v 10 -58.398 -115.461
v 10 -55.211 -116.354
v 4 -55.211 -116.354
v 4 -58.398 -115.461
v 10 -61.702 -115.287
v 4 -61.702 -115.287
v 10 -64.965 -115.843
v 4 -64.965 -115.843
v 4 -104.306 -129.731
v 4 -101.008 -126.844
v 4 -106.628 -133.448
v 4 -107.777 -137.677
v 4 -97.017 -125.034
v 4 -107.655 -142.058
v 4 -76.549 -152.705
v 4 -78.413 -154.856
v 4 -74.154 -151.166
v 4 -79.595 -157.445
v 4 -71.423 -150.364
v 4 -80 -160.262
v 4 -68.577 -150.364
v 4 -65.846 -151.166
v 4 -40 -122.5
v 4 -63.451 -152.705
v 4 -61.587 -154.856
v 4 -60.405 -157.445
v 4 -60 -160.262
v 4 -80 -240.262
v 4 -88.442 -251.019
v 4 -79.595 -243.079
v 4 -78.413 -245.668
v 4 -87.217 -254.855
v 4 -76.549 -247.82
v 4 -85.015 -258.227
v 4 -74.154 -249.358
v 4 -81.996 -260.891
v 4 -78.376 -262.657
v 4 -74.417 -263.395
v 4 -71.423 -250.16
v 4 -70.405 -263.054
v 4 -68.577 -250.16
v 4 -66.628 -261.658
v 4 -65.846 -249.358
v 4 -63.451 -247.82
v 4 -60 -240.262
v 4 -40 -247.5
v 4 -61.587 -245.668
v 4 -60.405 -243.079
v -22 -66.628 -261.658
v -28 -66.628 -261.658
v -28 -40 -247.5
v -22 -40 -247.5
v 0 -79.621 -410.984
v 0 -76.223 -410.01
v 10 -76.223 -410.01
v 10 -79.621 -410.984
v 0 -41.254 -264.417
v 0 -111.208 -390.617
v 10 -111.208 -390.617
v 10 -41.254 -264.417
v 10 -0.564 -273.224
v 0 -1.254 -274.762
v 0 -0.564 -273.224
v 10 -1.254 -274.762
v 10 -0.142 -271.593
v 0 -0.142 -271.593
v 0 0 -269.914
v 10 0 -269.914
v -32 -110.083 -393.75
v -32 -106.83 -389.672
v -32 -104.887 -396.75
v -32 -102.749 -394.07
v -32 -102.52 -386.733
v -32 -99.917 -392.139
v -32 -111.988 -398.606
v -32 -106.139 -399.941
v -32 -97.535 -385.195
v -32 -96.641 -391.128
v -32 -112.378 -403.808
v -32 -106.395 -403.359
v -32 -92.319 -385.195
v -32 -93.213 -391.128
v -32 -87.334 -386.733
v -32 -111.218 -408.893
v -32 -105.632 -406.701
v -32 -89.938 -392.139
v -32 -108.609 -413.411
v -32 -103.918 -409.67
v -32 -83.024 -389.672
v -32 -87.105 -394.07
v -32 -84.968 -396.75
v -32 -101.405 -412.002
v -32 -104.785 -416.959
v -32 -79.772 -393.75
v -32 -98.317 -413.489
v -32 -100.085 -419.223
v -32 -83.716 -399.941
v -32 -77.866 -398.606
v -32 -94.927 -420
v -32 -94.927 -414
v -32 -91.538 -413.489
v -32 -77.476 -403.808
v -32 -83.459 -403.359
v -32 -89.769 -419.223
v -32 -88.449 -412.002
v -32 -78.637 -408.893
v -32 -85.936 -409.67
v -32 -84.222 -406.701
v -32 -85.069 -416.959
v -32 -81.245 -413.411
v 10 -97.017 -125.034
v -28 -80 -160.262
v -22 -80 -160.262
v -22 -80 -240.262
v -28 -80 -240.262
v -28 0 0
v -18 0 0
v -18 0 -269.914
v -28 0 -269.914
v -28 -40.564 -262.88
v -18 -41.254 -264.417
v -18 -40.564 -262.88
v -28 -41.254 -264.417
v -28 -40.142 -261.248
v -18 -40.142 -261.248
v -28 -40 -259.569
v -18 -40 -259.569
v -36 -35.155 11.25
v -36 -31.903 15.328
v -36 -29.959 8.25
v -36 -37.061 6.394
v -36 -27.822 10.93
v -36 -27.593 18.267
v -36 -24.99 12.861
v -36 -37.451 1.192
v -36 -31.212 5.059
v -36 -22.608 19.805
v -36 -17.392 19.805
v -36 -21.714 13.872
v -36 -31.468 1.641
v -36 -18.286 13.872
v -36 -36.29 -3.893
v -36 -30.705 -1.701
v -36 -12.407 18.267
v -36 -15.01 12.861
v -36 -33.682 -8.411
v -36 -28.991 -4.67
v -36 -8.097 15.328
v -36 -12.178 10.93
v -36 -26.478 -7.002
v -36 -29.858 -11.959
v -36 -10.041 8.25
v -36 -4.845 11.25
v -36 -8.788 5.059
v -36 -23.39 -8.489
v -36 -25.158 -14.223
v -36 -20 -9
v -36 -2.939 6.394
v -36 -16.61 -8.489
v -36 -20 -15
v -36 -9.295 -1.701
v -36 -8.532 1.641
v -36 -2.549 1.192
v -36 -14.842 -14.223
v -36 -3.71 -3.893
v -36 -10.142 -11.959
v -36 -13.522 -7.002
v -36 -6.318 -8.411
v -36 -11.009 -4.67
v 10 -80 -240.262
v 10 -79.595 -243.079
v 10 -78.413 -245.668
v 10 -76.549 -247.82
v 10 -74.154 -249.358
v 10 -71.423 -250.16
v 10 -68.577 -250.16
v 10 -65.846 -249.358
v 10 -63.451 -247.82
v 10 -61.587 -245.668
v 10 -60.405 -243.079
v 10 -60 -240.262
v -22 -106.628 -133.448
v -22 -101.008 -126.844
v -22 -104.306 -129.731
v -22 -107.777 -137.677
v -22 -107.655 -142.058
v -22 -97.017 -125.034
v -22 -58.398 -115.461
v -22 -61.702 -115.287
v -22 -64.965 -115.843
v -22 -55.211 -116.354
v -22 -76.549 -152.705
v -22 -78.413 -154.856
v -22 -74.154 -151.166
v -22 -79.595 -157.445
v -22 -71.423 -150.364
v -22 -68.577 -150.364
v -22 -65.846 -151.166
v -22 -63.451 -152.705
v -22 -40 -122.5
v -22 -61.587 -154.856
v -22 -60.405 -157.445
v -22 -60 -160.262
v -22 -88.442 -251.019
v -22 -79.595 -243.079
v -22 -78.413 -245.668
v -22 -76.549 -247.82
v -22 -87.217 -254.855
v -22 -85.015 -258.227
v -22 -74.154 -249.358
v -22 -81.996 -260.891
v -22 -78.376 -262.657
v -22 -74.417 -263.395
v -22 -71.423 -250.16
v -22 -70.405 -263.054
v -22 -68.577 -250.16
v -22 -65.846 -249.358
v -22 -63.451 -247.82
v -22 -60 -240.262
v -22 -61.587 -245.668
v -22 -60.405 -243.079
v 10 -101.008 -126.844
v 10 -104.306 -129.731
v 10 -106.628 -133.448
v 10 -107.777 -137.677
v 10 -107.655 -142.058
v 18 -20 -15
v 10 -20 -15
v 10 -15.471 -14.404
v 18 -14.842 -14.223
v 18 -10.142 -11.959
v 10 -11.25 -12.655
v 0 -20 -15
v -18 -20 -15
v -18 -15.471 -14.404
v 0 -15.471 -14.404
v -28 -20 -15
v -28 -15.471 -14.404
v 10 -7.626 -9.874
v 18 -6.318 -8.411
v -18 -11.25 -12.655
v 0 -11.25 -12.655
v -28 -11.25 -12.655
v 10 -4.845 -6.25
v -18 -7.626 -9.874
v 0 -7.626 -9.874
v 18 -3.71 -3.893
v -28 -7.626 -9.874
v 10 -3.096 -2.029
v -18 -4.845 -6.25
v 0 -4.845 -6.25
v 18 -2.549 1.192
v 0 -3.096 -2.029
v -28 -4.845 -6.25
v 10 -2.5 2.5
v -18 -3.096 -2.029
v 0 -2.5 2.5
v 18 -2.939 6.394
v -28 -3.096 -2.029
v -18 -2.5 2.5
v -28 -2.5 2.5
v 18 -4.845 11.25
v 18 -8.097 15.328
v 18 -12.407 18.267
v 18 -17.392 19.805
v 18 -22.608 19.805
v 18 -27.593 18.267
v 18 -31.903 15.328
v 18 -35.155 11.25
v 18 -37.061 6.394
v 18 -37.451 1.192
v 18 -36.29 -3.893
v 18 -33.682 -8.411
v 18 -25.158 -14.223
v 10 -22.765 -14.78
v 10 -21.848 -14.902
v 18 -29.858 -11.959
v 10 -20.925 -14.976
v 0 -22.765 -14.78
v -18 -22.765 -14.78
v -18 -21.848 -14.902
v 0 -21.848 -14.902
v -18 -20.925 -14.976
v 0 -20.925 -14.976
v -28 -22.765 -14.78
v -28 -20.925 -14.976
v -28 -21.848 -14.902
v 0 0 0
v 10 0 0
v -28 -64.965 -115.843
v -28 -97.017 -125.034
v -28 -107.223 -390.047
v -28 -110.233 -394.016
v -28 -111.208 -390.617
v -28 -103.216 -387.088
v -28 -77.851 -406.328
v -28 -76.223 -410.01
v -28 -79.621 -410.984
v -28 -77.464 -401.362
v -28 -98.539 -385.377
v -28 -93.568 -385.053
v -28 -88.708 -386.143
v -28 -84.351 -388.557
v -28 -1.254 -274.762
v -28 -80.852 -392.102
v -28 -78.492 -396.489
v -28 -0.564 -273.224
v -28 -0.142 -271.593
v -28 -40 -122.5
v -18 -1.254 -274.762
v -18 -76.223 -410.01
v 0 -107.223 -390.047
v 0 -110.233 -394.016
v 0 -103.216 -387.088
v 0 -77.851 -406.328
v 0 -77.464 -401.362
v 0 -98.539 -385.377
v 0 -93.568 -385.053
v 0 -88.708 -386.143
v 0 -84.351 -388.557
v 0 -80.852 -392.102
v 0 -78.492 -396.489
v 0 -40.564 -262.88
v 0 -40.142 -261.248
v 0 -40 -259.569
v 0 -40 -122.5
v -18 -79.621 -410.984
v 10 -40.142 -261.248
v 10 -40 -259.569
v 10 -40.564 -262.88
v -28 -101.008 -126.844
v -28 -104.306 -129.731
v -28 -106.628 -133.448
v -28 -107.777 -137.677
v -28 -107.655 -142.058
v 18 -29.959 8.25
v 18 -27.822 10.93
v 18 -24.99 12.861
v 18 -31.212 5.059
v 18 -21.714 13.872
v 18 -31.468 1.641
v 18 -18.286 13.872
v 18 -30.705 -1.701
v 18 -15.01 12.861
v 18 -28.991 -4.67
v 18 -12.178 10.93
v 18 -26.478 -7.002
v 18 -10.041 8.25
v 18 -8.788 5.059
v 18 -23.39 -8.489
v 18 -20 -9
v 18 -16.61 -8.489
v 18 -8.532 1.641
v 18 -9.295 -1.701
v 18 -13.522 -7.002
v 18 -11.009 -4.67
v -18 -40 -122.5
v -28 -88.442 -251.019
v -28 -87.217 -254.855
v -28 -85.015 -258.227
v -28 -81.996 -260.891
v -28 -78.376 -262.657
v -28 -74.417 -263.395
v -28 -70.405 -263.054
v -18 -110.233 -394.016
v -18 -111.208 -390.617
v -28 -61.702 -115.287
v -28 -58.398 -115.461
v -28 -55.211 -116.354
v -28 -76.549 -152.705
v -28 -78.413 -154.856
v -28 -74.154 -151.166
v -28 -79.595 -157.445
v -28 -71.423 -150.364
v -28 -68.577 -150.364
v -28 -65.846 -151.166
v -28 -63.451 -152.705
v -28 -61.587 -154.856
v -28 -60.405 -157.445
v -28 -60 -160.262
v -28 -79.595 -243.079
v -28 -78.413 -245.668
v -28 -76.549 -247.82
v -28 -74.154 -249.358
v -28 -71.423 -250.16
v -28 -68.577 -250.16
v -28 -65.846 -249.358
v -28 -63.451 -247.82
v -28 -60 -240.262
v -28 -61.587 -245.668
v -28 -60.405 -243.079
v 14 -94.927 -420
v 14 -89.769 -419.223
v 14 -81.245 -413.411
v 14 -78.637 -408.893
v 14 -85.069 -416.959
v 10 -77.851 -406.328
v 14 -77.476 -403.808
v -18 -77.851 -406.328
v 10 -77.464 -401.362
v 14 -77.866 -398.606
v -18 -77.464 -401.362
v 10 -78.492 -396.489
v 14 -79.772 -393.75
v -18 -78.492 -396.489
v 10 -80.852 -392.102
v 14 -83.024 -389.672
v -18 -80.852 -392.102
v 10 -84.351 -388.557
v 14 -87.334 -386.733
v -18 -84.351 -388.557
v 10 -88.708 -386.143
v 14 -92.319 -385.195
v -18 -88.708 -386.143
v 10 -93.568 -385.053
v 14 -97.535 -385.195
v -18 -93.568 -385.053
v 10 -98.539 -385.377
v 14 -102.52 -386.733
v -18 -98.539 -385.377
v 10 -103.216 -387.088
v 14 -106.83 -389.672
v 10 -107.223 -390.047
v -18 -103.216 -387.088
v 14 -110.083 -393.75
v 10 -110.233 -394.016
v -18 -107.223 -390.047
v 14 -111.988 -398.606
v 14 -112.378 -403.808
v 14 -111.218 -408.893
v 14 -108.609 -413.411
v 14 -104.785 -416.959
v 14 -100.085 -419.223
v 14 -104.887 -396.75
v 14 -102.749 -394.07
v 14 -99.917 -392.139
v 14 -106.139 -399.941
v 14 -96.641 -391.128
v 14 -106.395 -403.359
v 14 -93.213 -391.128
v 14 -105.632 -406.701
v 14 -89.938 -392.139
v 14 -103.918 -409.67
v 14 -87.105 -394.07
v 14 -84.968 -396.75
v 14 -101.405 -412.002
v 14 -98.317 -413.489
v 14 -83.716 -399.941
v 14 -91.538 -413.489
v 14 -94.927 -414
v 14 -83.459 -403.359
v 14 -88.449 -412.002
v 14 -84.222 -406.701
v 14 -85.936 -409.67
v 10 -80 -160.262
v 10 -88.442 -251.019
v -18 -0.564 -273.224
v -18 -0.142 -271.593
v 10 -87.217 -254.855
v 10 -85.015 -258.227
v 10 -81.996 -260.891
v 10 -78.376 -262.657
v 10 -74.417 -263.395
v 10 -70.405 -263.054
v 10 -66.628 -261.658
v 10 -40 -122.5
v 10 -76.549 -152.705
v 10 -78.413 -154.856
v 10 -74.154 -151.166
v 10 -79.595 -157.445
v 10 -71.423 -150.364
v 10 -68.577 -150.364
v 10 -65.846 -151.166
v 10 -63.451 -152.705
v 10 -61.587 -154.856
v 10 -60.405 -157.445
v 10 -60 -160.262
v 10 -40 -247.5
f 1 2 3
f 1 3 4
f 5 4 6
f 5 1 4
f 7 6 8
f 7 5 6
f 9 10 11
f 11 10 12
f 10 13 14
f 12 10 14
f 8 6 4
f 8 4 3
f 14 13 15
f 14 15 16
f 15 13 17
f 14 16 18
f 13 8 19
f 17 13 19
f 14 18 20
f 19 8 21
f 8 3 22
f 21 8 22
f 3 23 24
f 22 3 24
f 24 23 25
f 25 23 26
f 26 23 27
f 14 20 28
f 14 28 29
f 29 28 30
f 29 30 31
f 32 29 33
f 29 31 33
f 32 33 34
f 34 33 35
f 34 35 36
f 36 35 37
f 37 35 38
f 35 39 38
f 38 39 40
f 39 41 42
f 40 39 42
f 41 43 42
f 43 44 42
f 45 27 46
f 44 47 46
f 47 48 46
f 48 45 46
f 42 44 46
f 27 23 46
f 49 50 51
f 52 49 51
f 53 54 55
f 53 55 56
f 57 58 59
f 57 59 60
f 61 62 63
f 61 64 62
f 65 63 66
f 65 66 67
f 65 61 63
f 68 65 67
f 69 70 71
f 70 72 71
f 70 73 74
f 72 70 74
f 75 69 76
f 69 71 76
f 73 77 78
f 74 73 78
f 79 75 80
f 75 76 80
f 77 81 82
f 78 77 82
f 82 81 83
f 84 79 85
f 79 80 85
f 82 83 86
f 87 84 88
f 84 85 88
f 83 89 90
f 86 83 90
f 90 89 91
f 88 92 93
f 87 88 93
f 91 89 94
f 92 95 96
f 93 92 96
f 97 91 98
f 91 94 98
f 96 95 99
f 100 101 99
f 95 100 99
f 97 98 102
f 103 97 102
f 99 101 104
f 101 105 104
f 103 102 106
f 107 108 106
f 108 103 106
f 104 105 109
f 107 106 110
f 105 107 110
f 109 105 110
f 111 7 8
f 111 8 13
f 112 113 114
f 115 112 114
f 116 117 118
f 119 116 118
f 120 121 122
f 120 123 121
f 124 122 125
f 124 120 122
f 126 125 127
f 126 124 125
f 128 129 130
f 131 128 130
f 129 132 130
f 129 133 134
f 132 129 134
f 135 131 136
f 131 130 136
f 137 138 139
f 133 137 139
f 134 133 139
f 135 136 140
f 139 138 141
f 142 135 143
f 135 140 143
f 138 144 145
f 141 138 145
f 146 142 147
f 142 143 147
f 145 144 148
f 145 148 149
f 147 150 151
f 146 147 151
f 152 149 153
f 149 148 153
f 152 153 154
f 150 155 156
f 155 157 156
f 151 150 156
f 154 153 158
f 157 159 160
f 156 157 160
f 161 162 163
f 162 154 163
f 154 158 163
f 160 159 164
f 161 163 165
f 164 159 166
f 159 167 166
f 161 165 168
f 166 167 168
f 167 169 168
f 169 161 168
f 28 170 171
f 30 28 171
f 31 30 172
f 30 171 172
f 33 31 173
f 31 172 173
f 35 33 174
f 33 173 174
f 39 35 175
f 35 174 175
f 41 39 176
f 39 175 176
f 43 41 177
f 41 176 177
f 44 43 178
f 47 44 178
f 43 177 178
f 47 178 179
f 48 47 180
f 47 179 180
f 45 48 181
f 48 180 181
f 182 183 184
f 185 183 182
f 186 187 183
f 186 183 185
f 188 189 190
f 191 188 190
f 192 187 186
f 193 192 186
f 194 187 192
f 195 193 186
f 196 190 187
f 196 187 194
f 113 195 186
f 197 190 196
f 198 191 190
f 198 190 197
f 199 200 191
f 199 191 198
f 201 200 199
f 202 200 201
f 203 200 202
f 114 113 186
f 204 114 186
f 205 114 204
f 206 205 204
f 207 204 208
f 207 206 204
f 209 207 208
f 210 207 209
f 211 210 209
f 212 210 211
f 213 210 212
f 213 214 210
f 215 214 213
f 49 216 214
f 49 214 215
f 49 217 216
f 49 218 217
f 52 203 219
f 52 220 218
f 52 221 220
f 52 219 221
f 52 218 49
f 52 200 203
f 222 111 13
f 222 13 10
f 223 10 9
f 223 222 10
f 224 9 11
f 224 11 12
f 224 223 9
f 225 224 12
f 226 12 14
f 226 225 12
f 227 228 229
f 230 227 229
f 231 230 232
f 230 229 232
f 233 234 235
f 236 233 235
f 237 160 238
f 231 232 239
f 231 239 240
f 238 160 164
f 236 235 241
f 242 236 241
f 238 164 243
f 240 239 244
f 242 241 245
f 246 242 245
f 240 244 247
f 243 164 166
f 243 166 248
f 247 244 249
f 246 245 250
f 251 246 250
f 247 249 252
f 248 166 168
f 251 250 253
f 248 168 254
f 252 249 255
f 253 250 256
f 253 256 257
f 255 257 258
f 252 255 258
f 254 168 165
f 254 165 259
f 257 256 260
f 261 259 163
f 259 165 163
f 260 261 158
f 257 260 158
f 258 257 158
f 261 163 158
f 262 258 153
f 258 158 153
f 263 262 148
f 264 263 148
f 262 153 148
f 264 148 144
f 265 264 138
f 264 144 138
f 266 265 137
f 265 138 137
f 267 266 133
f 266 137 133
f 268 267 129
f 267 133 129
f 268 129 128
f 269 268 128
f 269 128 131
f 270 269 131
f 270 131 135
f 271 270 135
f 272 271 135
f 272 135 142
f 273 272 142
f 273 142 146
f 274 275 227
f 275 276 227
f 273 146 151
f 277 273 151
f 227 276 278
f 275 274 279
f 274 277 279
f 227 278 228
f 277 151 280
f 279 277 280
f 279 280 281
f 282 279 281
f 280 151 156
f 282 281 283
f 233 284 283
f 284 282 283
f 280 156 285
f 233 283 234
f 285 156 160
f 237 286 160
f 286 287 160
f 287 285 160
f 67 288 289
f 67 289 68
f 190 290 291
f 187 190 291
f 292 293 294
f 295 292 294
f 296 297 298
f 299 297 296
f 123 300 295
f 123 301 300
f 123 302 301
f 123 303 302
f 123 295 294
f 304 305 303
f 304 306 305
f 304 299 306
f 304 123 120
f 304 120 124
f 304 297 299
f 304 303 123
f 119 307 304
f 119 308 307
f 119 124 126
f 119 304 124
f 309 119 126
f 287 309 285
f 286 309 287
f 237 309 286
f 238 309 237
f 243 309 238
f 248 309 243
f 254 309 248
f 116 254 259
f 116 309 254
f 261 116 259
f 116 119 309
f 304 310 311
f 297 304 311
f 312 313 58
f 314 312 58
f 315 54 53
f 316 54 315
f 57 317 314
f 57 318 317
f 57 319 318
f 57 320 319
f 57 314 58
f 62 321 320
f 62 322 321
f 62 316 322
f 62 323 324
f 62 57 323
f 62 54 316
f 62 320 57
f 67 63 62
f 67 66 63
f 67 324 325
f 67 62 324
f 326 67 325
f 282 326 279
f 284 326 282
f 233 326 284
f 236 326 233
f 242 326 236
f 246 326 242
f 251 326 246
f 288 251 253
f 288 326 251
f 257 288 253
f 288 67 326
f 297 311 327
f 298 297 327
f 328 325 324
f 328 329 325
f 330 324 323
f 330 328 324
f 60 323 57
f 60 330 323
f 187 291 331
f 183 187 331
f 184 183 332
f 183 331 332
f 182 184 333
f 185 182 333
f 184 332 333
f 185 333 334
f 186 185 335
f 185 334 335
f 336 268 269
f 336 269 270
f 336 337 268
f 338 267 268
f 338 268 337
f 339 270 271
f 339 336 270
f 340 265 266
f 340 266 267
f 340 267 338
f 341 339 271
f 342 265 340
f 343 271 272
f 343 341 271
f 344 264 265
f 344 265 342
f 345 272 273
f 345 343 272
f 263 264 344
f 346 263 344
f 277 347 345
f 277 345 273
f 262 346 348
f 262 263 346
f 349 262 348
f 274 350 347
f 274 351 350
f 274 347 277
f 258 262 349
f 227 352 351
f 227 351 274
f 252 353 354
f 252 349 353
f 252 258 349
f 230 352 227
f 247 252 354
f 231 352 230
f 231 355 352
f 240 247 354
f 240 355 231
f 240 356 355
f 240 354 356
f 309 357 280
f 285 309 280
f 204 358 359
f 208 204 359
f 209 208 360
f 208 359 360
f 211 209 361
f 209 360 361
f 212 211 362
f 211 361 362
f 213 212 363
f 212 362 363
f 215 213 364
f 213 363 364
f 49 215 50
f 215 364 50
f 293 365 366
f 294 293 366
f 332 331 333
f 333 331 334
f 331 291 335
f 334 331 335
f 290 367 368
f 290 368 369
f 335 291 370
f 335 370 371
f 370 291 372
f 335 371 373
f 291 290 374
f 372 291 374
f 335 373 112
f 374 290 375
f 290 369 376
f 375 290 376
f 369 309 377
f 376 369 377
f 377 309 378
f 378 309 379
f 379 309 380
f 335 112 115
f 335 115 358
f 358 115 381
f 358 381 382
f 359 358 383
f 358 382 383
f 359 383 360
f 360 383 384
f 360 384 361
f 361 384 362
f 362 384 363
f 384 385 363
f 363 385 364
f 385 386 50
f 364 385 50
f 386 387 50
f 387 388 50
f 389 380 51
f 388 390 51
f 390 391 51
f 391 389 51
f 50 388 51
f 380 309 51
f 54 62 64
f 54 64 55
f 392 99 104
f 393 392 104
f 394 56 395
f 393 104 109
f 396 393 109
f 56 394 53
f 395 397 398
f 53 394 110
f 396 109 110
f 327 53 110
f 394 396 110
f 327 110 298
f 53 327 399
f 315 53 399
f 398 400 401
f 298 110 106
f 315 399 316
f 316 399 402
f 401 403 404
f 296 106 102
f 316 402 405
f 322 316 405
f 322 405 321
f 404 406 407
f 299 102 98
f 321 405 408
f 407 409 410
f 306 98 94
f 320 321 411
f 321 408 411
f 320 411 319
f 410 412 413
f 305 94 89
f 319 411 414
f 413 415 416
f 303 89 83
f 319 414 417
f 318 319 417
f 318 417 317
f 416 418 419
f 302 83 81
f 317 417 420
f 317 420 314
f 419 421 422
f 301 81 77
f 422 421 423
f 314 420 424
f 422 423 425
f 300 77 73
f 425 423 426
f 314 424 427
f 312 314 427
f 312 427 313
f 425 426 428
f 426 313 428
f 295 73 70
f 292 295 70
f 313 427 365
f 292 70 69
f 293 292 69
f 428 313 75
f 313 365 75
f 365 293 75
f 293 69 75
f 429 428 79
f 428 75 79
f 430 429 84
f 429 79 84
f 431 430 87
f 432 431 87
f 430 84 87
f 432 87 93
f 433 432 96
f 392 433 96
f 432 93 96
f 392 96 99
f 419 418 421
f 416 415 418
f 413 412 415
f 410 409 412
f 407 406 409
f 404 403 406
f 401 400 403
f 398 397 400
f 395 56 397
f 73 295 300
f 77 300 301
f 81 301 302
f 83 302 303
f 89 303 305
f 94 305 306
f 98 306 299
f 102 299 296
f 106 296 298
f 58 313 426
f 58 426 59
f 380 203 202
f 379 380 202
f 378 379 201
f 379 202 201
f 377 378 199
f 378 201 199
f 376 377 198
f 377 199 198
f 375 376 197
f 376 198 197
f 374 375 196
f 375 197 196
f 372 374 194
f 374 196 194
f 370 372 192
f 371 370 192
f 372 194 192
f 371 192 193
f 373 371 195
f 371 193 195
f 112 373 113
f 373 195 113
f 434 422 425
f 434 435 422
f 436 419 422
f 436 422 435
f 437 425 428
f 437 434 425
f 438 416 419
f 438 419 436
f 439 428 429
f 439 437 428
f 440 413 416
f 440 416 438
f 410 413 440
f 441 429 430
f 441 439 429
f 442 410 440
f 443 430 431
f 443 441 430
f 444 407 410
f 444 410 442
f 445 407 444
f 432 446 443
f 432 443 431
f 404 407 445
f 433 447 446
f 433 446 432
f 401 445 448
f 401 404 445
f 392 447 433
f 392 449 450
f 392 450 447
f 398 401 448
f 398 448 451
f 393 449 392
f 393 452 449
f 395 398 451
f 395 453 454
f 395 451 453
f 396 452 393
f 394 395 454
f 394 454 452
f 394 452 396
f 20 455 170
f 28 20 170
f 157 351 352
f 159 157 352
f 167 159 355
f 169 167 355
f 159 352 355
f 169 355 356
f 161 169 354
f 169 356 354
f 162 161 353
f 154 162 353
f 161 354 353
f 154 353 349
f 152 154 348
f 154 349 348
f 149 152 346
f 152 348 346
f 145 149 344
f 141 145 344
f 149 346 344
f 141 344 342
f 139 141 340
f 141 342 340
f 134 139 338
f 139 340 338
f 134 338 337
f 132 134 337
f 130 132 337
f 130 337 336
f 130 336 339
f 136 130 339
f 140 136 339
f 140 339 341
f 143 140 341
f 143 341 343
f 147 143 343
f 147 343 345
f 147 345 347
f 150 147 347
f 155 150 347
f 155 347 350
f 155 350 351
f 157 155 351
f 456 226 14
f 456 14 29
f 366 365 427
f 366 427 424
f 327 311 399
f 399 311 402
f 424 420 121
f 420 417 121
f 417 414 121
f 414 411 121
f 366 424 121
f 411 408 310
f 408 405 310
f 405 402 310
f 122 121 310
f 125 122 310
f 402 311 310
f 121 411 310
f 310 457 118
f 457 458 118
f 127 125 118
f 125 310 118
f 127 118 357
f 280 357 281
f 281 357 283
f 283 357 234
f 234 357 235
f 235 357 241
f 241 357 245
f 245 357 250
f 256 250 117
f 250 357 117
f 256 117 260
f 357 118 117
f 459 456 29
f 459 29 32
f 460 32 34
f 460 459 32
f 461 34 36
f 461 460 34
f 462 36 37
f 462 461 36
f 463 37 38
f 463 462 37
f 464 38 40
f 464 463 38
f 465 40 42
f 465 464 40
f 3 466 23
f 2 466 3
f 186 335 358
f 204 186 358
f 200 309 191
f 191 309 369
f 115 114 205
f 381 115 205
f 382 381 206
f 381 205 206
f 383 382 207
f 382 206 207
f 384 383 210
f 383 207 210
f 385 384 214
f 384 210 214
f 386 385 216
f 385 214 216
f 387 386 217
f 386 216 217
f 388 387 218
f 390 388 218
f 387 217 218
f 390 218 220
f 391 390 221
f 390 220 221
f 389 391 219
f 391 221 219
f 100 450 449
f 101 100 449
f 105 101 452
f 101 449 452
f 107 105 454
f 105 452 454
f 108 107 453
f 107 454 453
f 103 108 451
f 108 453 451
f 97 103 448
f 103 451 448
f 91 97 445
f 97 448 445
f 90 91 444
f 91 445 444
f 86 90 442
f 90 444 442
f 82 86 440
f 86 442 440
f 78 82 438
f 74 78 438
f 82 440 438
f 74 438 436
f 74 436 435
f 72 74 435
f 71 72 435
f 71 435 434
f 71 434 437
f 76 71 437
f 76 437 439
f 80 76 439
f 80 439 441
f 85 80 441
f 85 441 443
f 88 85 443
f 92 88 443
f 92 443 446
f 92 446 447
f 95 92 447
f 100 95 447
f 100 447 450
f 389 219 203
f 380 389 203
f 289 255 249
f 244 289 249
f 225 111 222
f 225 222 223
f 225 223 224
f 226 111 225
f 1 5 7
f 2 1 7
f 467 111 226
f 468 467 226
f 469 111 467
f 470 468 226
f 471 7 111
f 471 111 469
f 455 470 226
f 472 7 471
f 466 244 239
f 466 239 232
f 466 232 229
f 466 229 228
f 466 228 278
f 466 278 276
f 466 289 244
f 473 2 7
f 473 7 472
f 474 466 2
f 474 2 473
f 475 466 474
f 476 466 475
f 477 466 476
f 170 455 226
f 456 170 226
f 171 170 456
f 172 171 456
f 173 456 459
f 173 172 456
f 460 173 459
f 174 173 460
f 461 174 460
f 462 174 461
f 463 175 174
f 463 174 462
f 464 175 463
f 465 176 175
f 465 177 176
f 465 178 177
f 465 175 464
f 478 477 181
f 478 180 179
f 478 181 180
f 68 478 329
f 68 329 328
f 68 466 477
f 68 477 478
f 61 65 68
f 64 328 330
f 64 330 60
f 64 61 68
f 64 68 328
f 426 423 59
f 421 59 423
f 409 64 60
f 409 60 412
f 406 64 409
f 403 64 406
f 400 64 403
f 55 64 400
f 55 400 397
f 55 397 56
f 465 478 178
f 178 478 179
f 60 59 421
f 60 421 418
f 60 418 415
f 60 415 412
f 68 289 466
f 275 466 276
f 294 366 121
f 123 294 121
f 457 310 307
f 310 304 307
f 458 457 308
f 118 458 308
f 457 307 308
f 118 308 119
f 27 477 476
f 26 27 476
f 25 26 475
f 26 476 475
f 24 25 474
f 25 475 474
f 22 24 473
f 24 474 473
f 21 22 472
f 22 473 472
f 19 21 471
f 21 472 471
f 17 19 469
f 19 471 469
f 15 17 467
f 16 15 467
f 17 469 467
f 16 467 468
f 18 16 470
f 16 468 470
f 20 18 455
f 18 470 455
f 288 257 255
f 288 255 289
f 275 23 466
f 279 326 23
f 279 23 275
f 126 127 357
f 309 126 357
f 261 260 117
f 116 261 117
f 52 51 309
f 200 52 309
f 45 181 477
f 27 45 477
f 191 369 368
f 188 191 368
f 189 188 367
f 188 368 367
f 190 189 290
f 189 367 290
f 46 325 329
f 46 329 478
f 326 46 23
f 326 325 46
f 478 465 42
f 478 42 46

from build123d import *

# Parameters (mm, degrees)
DODANIE_WYCI_GNI_CIE1_DEPTH      = 10
DODANIE_WYCI_GNI_CIE2_DEPTH      = 8
DODANIE_WYCI_GNI_CIE2_DEPTH_BACK = 46
SZKIC2_R                         = 17.5
DODANIE_WYCI_GNI_CIE3_DEPTH      = 4
DODANIE_WYCI_GNI_CIE3_DEPTH_BACK = 42
SZKIC3_R                         = 17.5
WYTNIJ_WYCI_GNI_CIE1_REACH       = 440.128
SZKIC4_R                         = 11.5
WYTNIJ_WYCI_GNI_CIE2_REACH       = 439.653
SZKIC5_R                         = 11.5
ZAOKR_GLENIE2_R                  = 10
DODANIE_WYCI_GNI_CIE4_DEPTH      = 6
WYTNIJ_WYCI_GNI_CIE6_DEPTH       = 436.624710447
WYTNIJ_WYCI_GNI_CIE6_DEPTH_BACK  = 436.624710447


with BuildPart() as part:
    # Szkic1 → Dodanie-wyciągnięcie1 (new body)
    with BuildSketch(Plane(origin=(0, 0, 0), x_dir=(0, 0, -1), z_dir=(1, 0, 0))):
        Polygon((0, 0), (272.5, 0), (410.009643137, -76.222839853), (410.984168354, -79.621413171), (394.015831646, -110.233102921), (390.617258327, -111.207628138), (262.155296626, -40), (122.5, -40), (-2.5, -20), (-2.5, -2.5), align=None)
    extrude(amount=DODANIE_WYCI_GNI_CIE1_DEPTH)


with BuildPart() as body_2:
    # Lustro3: mirrored copy
    add(part.part.mirror(Plane.ZY.offset(9)))


with BuildPart() as part_1:
    add(part.part)

    add(body_2.part)  # Dodanie-wyciągnięcie2 merges body 2
    # Szkic2 → Dodanie-wyciągnięcie2 (add, two sides: drawn at the far end of the back side and taken through both)
    with BuildSketch(Plane(origin=(10, 0, 0), x_dir=(0, 0, -1), z_dir=(1, 0, 0)).offset(-DODANIE_WYCI_GNI_CIE2_DEPTH_BACK)):
        with Locations((-2.5, -20)):
            Circle(SZKIC2_R)
    extrude(amount=DODANIE_WYCI_GNI_CIE2_DEPTH + DODANIE_WYCI_GNI_CIE2_DEPTH_BACK)

    # Szkic3 → Dodanie-wyciągnięcie3 (add, two sides: drawn at the far end of the back side and taken through both)
    with BuildSketch(Plane(origin=(10, 0, 0), x_dir=(0, 0, -1), z_dir=(1, 0, 0)).offset(-DODANIE_WYCI_GNI_CIE3_DEPTH_BACK)):
        with Locations((402.5, -94.927258046)):
            Circle(SZKIC3_R)
    extrude(amount=DODANIE_WYCI_GNI_CIE3_DEPTH + DODANIE_WYCI_GNI_CIE3_DEPTH_BACK)

    # Szkic4 → Wytnij-wyciągnięcie1 (cut, up to next)
    with BuildSketch(Plane(origin=(18, 0, 0), x_dir=(0, 0, -1), z_dir=(1, 0, 0)), mode=Mode.PRIVATE) as wytnij_wyci_gni_cie1_sk1:
        with Locations((-2.5, -20)):
            Circle(SZKIC4_R)
    wytnij_wyci_gni_cie1_tool1 = extrude(wytnij_wyci_gni_cie1_sk1.sketch, amount=-WYTNIJ_WYCI_GNI_CIE1_REACH, mode=Mode.PRIVATE) & part_1.part
    add(wytnij_wyci_gni_cie1_tool1.solids().sort_by_distance((18, -20, 2.5))[0], mode=Mode.SUBTRACT)

    # Szkic5 → Wytnij-wyciągnięcie2 (cut, up to next)
    with BuildSketch(Plane(origin=(14, 0, 0), x_dir=(0, 0, -1), z_dir=(1, 0, 0)), mode=Mode.PRIVATE) as wytnij_wyci_gni_cie2_sk1:
        with Locations((402.5, -94.927258046)):
            Circle(SZKIC5_R)
    wytnij_wyci_gni_cie2_tool1 = extrude(wytnij_wyci_gni_cie2_sk1.sketch, amount=-WYTNIJ_WYCI_GNI_CIE2_REACH, mode=Mode.PRIVATE) & part_1.part
    add(wytnij_wyci_gni_cie2_tool1.solids().sort_by_distance((14, -94.927258, -402.5))[0], mode=Mode.SUBTRACT)

    # Zaokrąglenie2
    zaokr_glenie2_edges = [part_1.edges().sort_by_distance(p)[0] for p in [
        (5, 0, -272.5),
        (5, -40, -262.155296626),
        (-23, -40, -262.155296626),
        (-23, 0, -272.5),
    ]]
    fillet(zaokr_glenie2_edges, radius=ZAOKR_GLENIE2_R)


with BuildPart() as body_2_2:
    # Szkic6 → Dodanie-wyciągnięcie4 (new body)
    with BuildSketch(Plane.ZY.offset(28)):
        with BuildLine():
            Line((-122.5, -40), (-116.354286397, -55.211174944))
            ThreePointArc((-116.354286397, -55.211174944), (-115.282601194, -60.045234502), (-115.843118776, -64.964834183))
            Line((-115.843118776, -64.964834183), (-125.033969922, -97.01714122))
            ThreePointArc((-125.033969922, -97.01714122), (-131.504106398, -105.603302325), (-142.057618026, -107.654697178))
            Line((-142.057618026, -107.654697178), (-251.01872134, -88.441914816))
            ThreePointArc((-251.01872134, -88.441914816), (-261.89590937, -80.245365723), (-261.658212568, -66.627725079))
            Line((-261.658212568, -66.627725079), (-247.5, -40))
            Line((-247.5, -40), (-122.5, -40))
        make_face()
    dodanie_wyci_gni_cie4 = extrude(amount=-DODANIE_WYCI_GNI_CIE4_DEPTH)


with BuildPart() as part_2:
    add(part_1.part)

    # Lustro4: Dodanie-wyciągnięcie4 across plane
    add(dodanie_wyci_gni_cie4.mirror(Plane.ZY.offset(9)))


with BuildPart() as wytnij_wyci_gni_cie6_tool:
    # Szkic17 → Wytnij-wyciągnięcie6 (new, two sides: drawn at the far end of the back side and taken through both)
    with BuildSketch(Plane.ZY.offset(9).offset(-WYTNIJ_WYCI_GNI_CIE6_DEPTH_BACK)):
        with BuildLine():
            Line((-240.262044215, -60), (-160.262044215, -60))
            ThreePointArc((-160.262044215, -60), (-150.262044215, -70), (-160.262044215, -80))
            Line((-160.262044215, -80), (-240.262044215, -80))
            ThreePointArc((-240.262044215, -80), (-250.262044215, -70), (-240.262044215, -60))
        make_face()
    extrude(amount=WYTNIJ_WYCI_GNI_CIE6_DEPTH + WYTNIJ_WYCI_GNI_CIE6_DEPTH_BACK)


with BuildPart() as part_3:
    add(part_2.part)

    # Wytnij-wyciągnięcie6: cut by wytnij_wyci_gni_cie6_tool
    add(wytnij_wyci_gni_cie6_tool.part, mode=Mode.SUBTRACT)


with BuildPart() as body_2_2_1:
    add(body_2_2.part)

    # Wytnij-wyciągnięcie6: cut by wytnij_wyci_gni_cie6_tool
    add(wytnij_wyci_gni_cie6_tool.part, mode=Mode.SUBTRACT)


solid = Compound([part_3.part, body_2_2_1.part])
